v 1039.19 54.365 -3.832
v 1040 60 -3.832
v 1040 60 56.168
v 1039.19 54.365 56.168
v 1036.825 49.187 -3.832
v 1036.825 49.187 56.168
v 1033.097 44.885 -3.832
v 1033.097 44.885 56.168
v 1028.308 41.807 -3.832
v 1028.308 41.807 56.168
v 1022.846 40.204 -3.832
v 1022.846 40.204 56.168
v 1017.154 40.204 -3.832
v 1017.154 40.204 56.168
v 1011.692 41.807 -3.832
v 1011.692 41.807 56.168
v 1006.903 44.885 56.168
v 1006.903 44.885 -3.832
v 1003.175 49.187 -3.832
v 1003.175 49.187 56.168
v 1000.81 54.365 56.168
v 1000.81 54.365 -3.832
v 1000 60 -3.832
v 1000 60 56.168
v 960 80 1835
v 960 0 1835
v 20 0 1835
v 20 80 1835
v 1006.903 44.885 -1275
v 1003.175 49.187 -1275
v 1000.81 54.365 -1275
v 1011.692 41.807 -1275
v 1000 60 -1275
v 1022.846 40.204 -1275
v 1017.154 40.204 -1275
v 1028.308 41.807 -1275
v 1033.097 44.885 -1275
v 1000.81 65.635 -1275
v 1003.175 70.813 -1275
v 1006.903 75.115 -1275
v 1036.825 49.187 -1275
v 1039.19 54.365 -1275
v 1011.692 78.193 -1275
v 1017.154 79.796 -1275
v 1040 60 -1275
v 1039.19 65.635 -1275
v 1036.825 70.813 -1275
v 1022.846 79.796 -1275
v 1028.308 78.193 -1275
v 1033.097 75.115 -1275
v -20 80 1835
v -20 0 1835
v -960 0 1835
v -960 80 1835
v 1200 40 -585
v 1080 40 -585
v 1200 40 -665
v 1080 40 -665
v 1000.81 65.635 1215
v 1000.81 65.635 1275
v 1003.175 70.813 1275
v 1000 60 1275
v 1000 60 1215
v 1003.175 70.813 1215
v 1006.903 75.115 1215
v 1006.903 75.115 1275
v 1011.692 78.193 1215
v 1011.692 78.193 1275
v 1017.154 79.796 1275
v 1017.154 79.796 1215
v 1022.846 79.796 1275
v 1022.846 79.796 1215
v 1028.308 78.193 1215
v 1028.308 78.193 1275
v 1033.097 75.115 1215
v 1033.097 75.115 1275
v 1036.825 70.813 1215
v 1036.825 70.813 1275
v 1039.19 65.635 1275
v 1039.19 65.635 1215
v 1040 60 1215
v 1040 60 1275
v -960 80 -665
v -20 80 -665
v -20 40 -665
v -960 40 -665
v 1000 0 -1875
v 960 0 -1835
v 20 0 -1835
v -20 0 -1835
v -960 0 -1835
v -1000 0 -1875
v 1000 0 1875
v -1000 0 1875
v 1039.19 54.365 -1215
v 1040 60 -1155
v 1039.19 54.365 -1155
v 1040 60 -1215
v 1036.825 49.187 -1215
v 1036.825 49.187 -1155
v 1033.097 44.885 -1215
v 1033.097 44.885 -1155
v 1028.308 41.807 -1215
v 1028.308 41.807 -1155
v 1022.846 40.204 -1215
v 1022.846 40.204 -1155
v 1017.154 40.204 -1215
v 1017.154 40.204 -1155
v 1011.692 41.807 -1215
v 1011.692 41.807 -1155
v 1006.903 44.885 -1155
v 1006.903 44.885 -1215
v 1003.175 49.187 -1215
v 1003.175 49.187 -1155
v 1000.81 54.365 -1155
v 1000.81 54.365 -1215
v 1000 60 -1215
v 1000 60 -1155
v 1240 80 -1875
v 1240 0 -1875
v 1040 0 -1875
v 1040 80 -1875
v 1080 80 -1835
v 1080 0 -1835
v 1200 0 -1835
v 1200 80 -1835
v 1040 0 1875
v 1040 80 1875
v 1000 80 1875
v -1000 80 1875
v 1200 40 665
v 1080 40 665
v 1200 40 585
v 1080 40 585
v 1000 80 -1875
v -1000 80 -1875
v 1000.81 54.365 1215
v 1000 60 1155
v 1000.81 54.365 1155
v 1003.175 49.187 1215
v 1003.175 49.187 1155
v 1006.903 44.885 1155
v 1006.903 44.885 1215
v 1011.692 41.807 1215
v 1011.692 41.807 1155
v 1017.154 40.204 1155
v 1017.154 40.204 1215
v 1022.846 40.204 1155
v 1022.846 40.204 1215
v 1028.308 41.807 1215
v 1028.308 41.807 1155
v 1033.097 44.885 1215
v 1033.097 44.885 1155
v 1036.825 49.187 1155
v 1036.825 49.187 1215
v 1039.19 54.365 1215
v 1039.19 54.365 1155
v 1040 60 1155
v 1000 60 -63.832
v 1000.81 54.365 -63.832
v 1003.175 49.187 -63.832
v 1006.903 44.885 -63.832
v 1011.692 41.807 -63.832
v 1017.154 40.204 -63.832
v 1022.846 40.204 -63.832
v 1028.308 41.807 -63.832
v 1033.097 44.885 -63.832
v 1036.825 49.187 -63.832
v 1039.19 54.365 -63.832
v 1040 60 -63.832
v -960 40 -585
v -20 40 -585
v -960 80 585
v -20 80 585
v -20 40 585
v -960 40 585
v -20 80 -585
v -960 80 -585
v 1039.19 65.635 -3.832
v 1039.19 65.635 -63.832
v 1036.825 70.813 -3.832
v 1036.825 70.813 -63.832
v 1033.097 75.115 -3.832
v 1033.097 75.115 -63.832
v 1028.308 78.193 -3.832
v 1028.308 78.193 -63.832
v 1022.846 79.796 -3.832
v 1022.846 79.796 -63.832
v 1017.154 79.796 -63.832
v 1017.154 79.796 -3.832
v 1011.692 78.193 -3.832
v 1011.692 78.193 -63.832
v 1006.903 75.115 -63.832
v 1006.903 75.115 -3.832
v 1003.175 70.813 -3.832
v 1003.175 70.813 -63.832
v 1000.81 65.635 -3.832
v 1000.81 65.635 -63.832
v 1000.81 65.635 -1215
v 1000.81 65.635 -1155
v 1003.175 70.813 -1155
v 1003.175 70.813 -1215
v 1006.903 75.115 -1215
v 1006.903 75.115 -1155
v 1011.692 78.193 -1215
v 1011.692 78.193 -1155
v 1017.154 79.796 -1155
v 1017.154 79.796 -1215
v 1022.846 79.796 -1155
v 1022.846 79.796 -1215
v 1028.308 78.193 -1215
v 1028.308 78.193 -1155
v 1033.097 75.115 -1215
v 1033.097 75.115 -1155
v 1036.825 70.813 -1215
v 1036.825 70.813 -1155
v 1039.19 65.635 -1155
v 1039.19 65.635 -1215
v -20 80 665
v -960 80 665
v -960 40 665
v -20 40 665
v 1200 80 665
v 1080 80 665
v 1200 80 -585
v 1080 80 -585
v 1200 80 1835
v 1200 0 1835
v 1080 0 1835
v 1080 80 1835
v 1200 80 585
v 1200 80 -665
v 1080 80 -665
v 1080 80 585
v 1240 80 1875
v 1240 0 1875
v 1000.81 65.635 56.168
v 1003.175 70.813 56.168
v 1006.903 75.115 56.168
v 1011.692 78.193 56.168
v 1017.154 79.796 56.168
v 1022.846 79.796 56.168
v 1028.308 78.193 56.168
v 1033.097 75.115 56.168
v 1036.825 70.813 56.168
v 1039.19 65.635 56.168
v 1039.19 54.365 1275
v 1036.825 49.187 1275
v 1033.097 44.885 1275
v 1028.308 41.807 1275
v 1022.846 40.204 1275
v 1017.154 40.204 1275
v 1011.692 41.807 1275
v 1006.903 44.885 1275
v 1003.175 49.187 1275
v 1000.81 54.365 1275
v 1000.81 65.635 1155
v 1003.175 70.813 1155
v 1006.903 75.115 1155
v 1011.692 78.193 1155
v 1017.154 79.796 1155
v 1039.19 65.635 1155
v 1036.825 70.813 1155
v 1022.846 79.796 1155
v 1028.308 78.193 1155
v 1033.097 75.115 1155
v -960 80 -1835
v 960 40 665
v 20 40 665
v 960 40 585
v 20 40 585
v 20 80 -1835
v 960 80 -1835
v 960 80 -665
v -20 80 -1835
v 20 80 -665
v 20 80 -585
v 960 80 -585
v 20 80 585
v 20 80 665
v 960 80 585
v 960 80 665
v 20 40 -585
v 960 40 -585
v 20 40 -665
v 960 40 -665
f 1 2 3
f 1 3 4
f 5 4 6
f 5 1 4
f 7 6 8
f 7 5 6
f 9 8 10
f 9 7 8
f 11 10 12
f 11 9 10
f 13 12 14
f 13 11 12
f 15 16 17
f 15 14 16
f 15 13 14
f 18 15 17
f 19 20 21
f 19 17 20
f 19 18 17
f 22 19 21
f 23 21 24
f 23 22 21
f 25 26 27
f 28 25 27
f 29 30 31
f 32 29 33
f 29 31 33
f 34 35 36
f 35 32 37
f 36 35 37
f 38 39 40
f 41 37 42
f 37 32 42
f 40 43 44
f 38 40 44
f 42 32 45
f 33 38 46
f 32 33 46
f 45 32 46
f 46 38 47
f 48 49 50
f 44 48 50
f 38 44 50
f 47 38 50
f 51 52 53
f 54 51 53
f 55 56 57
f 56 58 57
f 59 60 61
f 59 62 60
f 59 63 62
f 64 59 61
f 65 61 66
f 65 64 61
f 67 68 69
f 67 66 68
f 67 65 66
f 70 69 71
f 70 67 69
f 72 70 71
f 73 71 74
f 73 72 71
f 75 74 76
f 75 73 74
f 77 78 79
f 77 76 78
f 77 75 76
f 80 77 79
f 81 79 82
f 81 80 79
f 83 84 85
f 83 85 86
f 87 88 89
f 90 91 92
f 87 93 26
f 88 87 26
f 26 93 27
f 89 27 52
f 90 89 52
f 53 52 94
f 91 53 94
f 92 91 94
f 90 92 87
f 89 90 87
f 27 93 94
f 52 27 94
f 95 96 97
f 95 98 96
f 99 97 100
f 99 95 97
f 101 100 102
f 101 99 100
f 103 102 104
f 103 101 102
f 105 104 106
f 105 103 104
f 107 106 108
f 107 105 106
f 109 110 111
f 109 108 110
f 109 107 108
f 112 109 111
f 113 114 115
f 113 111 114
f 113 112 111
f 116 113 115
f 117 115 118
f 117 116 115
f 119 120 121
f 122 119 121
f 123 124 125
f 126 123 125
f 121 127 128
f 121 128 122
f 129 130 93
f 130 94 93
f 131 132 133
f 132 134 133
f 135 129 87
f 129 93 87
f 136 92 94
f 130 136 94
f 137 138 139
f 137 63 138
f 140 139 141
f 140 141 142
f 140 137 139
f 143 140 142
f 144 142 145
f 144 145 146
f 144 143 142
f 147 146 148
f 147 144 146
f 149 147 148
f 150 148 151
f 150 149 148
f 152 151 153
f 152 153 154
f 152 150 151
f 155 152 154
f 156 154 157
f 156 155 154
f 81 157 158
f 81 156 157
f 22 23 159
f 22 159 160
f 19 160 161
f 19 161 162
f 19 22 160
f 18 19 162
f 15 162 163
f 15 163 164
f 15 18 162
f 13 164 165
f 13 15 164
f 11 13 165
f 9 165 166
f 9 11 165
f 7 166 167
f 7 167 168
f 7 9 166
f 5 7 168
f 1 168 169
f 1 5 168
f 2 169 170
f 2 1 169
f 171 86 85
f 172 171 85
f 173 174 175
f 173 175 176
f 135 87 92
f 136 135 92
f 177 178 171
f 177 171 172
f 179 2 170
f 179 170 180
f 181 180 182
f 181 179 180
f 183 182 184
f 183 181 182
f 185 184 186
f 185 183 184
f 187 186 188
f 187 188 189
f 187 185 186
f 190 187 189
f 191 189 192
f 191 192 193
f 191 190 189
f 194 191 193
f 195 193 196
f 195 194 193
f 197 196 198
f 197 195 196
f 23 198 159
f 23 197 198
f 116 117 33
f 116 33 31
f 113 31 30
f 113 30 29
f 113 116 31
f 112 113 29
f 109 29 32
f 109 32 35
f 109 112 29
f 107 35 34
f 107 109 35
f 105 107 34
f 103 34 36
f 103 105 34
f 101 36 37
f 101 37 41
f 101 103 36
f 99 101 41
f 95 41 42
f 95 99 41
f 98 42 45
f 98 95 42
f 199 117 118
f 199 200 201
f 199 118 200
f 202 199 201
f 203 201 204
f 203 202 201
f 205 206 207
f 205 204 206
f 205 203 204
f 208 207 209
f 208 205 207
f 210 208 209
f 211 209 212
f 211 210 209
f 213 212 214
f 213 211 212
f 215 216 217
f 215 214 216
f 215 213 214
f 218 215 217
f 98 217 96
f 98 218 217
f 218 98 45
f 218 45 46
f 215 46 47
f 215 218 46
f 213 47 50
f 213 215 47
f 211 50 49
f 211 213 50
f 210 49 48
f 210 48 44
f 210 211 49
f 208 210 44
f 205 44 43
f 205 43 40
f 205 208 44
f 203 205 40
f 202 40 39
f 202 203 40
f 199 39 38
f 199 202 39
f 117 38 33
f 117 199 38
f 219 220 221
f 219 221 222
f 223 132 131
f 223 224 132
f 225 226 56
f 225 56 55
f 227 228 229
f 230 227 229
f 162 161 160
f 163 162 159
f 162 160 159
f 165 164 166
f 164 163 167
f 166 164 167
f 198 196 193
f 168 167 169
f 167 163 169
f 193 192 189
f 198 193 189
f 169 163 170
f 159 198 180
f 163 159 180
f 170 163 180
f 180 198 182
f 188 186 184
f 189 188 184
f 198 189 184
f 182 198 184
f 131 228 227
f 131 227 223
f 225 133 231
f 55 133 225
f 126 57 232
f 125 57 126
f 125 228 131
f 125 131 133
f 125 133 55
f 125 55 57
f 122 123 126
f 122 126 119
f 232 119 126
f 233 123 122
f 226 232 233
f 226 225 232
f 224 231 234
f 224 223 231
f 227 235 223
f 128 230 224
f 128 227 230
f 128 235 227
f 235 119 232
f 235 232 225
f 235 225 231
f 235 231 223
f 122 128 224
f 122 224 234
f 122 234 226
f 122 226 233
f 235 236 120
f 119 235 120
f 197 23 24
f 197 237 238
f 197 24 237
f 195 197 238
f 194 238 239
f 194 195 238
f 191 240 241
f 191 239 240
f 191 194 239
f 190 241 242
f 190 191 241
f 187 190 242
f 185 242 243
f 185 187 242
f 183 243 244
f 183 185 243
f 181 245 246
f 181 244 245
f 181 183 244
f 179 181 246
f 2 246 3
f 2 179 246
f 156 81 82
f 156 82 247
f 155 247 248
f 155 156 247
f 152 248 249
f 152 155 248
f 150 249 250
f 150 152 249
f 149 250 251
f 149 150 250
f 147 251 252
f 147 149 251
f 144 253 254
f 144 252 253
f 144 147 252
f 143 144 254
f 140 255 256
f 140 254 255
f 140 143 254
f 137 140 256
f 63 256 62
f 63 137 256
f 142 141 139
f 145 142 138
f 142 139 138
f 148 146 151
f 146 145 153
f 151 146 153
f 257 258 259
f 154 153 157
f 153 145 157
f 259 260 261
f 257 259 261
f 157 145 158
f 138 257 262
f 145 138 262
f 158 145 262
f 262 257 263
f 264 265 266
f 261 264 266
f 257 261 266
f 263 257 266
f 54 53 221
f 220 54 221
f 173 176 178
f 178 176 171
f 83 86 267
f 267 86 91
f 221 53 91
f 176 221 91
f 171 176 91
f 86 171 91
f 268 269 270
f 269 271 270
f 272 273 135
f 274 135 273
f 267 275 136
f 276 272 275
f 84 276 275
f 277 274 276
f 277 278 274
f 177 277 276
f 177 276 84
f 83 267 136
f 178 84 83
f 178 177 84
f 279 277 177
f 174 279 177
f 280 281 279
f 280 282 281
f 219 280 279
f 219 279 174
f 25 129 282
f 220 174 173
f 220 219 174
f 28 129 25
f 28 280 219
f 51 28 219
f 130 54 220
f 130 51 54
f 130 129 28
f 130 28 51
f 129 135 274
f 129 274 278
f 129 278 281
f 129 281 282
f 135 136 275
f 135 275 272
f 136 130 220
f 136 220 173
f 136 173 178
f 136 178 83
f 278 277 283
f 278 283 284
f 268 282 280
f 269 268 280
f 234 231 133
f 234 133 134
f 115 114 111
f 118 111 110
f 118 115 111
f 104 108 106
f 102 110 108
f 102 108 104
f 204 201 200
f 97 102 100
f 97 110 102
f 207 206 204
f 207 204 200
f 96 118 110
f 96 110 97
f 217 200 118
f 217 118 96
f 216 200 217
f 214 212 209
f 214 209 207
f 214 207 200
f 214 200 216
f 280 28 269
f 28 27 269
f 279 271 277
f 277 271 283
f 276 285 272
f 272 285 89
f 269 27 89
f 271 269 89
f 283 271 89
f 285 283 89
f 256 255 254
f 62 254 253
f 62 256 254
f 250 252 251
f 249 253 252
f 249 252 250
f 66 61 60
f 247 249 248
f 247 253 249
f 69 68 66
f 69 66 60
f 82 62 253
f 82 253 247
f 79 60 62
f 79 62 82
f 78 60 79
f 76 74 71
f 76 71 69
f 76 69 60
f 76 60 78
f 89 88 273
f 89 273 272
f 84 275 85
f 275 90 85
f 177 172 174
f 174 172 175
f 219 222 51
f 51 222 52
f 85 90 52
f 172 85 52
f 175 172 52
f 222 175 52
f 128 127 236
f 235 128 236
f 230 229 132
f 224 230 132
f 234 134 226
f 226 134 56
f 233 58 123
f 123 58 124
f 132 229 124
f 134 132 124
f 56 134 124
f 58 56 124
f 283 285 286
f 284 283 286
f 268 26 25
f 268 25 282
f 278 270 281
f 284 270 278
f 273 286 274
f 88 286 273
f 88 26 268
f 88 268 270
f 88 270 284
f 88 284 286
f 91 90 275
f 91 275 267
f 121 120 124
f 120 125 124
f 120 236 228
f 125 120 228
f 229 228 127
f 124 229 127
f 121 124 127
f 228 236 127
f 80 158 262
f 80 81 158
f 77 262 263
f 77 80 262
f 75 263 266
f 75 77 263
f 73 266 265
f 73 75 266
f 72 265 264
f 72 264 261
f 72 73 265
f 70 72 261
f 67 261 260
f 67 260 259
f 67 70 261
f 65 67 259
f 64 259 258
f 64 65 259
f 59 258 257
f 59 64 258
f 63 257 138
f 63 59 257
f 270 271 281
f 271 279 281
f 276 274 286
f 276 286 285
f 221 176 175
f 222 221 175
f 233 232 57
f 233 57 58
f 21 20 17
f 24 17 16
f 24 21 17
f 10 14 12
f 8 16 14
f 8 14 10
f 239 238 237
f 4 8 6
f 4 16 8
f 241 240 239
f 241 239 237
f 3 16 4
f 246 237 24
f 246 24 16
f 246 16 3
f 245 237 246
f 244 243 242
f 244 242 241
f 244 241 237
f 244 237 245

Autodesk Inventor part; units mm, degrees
sketch "Sketch1" plane through (0, 0, 0) normal (0, 1, 0) x (-1, 0, 0)
  line L0 (1000, 1875) -> (-1000, 1875)
  line L1 (-1000, 1875) -> (-1000, -1875)
  line L2 (-1000, -1875) -> (1000, -1875)
  line L3 (1000, -1875) -> (1000, 1875)
  line L4 (1000, 1875) -> (-1000, -1875) construction
  line L5 (-1000, 1875) -> (1000, -1875) construction
  line L6 (1000, 1875) -> (-1000, 1875)
  line L7 (-1000, 1875) -> (-1000, 1835)
  line L8 (-1000, 1835) -> (1000, 1835)
  line L9 (1000, 1835) -> (1000, 1875)
  line L10 (1000, -1875) -> (-1000, -1875)
  line L11 (-1000, -1875) -> (-1000, -1835)
  line L12 (-1000, -1835) -> (1000, -1835)
  line L13 (1000, -1835) -> (1000, -1875)
  line L14 (-1000, 40) -> (-1000, -40)
  line L15 (1000, -40) -> (1000, 40)
  line L16 (-960, 38.4) -> (1000, -40) construction
  line L17 (1000, 1875) -> (960, 1875)
  line L18 (960, 1835) -> (960, -1835)
  line L19 (960, -1875) -> (1000, -1875)
  line L20 (1000, -1875) -> (1000, 1875)
  line L21 (-1000, 1875) -> (-960, 1875)
  line L22 (-960, 1835) -> (-960, -1835)
  line L23 (-960, -1875) -> (-1000, -1875)
  line L24 (-1000, -1875) -> (-1000, 1875)
  line L25 (20, 1875) -> (-20, 1875)
  line L26 (-20, 1835) -> (-20, -1835)
  line L27 (-20, -1875) -> (20, -1875)
  line L28 (20, -1835) -> (20, 1835)
  line L29 (20, 1875) -> (-20, -1875) construction
  line L30 (-20, 1875) -> (20, -1875) construction
  line L31 (-1000, 1875) -> (-1000, 1275) construction
  line L32 (-1000, -1875) -> (-1000, -1275) construction
  line L33 (-1000, 1275) -> (-1040, 1275)
  line L34 (-1040, 1275) -> (-1040, 1155)
  line L35 (-1040, 1155) -> (-1000, 1155)
  line L36 (-1000, 1155) -> (-1000, 1275)
  line L37 (-1000, -1275) -> (-1040, -1275)
  line L38 (-1040, -1275) -> (-1040, -1155)
  line L39 (-1040, -1155) -> (-1000, -1155)
  line L40 (-1000, -1155) -> (-1000, -1275)
  line L41 (-1000, 60) -> (-1040, 60)
  line L42 (-1040, 60) -> (-1040, -60)
  line L43 (-1040, -60) -> (-1000, -60)
  line L44 (-1000, -60) -> (-1000, 60)
  line L45 (-1040, 1875) -> (-1240, 1875)
  line L46 (-1240, 1875) -> (-1240, -1875)
  line L47 (-1240, -1875) -> (-1040, -1875)
  line L48 (-1040, -1875) -> (-1040, 1875)
  line L49 (-1040, 1875) -> (-1240, 1875)
  line L50 (-1240, 1875) -> (-1240, 1835)
  line L51 (-1240, 1835) -> (-1040, 1835)
  line L52 (-1040, 1835) -> (-1040, 1875)
  line L53 (-1240, 1875) -> (-1200, 1875)
  line L54 (-1200, 1835) -> (-1200, -1835)
  line L55 (-1200, -1875) -> (-1240, -1875)
  line L56 (-1240, -1875) -> (-1240, 1875)
  line L57 (-1040, -1835) -> (-1240, -1835)
  line L58 (-1240, -1835) -> (-1240, -1875)
  line L59 (-1240, -1875) -> (-1040, -1875)
  line L60 (-1040, -1875) -> (-1040, -1835)
  line L61 (-1040, 1875) -> (-1080, 1875)
  line L62 (-1080, 1835) -> (-1080, -1835)
  line L63 (-1080, -1875) -> (-1040, -1875)
  line L64 (-1040, -1875) -> (-1040, 1875)
  line L65 (-1080, 40) -> (-1200, 40)
  line L66 (-1240, 40) -> (-1240, -40)
  line L67 (-1200, -40) -> (-1080, -40)
  line L68 (-1080, -40) -> (-1080, 40)
  line L69 (-998.5851, 1275.1499) -> (-998.5851, 1144.5155) construction
  line L70 (-998.5851, 1144.5155) -> (-1036.0656, 1144.5155) construction
  line L71 (-1036.0656, 1144.5155) -> (-1036.0656, 1275.1499) construction
  line L72 (-1036.0656, 1275.1499) -> (-998.5851, 1275.1499) construction
  line L73 (-1007.8995, 60.5323) -> (-1007.8995, -70.1021) construction
  line L74 (-1007.8995, -70.1021) -> (-1038.0125, -70.1021) construction
  line L75 (-1038.0125, -70.1021) -> (-1038.0125, 60.5323) construction
  line L76 (-1038.0125, 60.5323) -> (-1007.8995, 60.5323) construction
  line L77 (-1037.0125, -1157.0323) -> (-1006.8995, -1157.0323) construction
  line L78 (-1006.8995, -1157.0323) -> (-1006.8995, -1287.6667) construction
  line L79 (-1006.8995, -1287.6667) -> (-1037.0125, -1287.6667) construction
  line L80 (-1037.0125, -1287.6667) -> (-1037.0125, -1157.0323) construction
  line L81 (1000, 1875) -> (1000, 625) construction
  line L82 (1000, -1875) -> (1000, -625) construction
  line L83 (1000, -625) -> (-1000, -625) construction
  line L84 (960, 625) -> (-1000, 625) construction
  line L85 (-960, 665) -> (-960, 585)
  line L86 (960, 585) -> (960, 665)
  line L87 (960, 665) -> (-960, 585) construction
  line L88 (-960, 665) -> (960, 585) construction
  line L89 (-960, -585) -> (-960, -665)
  line L90 (960, -665) -> (960, -585)
  line L91 (960, -585) -> (-960, -665) construction
  line L92 (-960, -585) -> (960, -665) construction
  line L93 (960, 665) -> (20, 665)
  line L94 (-20, 665) -> (-960, 665)
  line L95 (-960, 585) -> (-20, 585)
  line L96 (20, 585) -> (960, 585)
  line L97 (960, -585) -> (20, -585)
  line L98 (-20, -585) -> (-960, -585)
  line L99 (-960, -665) -> (-20, -665)
  line L100 (20, -665) -> (960, -665)
  point P0 (0, 0)
  point P1 (-1000, 0)
  point P2 (-1040, -60)
  point P3 (0, 625)
  point P4 (0, -625)
  dimension "d0" = 2000
  dimension "d1" = 3750
  dimension "d2" = 40
  dimension "d3" = 40
  dimension "d4" = 80
  dimension "d5" = 40
  dimension "d6" = 40
  dimension "d7" = 40
  dimension "d8" = 600
  dimension "d9" = 600
  dimension "d10" = 40
  dimension "d11" = 120
  dimension "d12" = 40
  dimension "d13" = 120
  dimension "d14" = 40
  dimension "d15" = 120
  dimension "d16" = 200
  dimension "d17" = 40
  dimension "d18" = 40
  dimension "d30" = 1250
  dimension "d31" = 1250
  dimension "d32" = 80
  dimension "d33" = 80
extrude "Extrusion1" add sketch "Sketch1" along normal blind 80 contours L3 L8 L1 L0 | L3 L12 L18 L8 | L28 L12 L26 L8 | L3 L2 L1 L12 | L22 L12 L1 L8 | L34 L48 L42 L38 L57 L62 L51 | L51 L46 L45 L48 | L54 L57 L46 L51 | L48 L47 L46 L57
sketch "Sketch2" plane through (0, 80, 0) normal (0, 1, 0) x (1, 0, 0)
  line L0 (960, 40) -> (-1000, 40) construction
  line L1 (-1000, -40) -> (960, -40) construction
  line L2 (1200, 40) -> (1080, 40) construction
  line L3 (1080, -40) -> (1200, -40) construction
  line L4 (1000, -1275) -> (1040, -1275) construction
  line L5 (1040, -1155) -> (1000, -1155) construction
  line L6 (1000, -60) -> (1040, -60) construction
  line L7 (1040, 60) -> (1000, 60) construction
  line L8 (1040, 1155) -> (1000, 1155) construction
  line L9 (1000, 1275) -> (1040, 1275) construction
  line L10 (-960, -1835) -> (-960, 1835) projected
  line L11 (-20, 1835) -> (-20, -1835) projected
  line L12 (-960, -40) -> (-20, -40)
  line L13 (-20, -40) -> (-20, 40)
  line L14 (-20, 40) -> (-960, 40)
  line L15 (-960, 40) -> (-960, -40)
  line L16 (20, -1835) -> (20, 1835) projected
  line L17 (20, -40) -> (960, -40)
  line L18 (960, -40) -> (960, 40)
  line L19 (960, 40) -> (20, 40)
  line L20 (20, 40) -> (20, -40)
  line L21 (1080, -40) -> (1200, -40)
  line L22 (1200, -40) -> (1200, 40)
  line L23 (1200, 40) -> (1080, 40)
  line L24 (1080, 40) -> (1080, -40)
  line L25 (-20, -585) -> (-960, -585) projected
  line L26 (-960, -665) -> (-20, -665) projected
  line L27 (20, -665) -> (960, -665) projected
  line L28 (960, -585) -> (20, -585) projected
  line L29 (20, -1835) -> (20, 1835) projected
  line L30 (960, 1835) -> (960, -1835) construction
  line L31 (-960, 585) -> (-20, 585) projected
  line L32 (-20, 665) -> (-960, 665) projected
  line L33 (20, 585) -> (960, 585) projected
  line L34 (960, 665) -> (20, 665) projected
  line L35 (960, 585) -> (-960, 665) construction
  line L36 (1080, -1835) -> (1080, 1835) projected
  line L37 (1080, -665) -> (1200, -665)
  line L38 (1200, -665) -> (1200, -585)
  line L39 (1200, -585) -> (1080, -585)
  line L40 (1080, -585) -> (1080, -665)
  line L41 (1200, 1835) -> (1200, -1835) projected
  line L42 (1080, 585) -> (1200, 585)
  line L43 (1200, 585) -> (1200, 665)
  line L44 (1200, 665) -> (1080, 665)
  line L45 (1080, 665) -> (1080, 585)
  point P0 (0, 0)
sketch "Sketch3" plane through (1000, 0, 1875) normal (1, 0, 0) x (0, 0, -1)
  line L0 (0, 0) -> (3750, 0) construction
  line L1 (3750, 0) -> (3750, 80) construction
  line L2 (0, 80) -> (3750, 80) construction
  line L3 (0, 0) -> (0, 80) construction
  line L4 (0, 0) -> (0, 80) construction
  line L5 (0, 40) -> (3750, 40) construction
  line L6 (0, 80) -> (3750, 80) construction
  line L7 (600, 0) -> (720, 0) construction
  line L8 (720, 0) -> (720, 80) construction
  line L9 (720, 80) -> (600, 80) construction
  line L10 (600, 80) -> (600, 0) construction
  line L11 (1815, 0) -> (1935, 0) construction
  line L12 (1935, 0) -> (1935, 80) construction
  line L13 (1935, 80) -> (1815, 80) construction
  line L14 (1815, 80) -> (1815, 0) construction
  line L15 (3030, 0) -> (3150, 0) construction
  line L16 (3150, 0) -> (3150, 80) construction
  line L17 (3150, 80) -> (3030, 80) construction
  line L18 (3030, 80) -> (3030, 0) construction
  point P0 (1875, 0)
  point P1 (660, 40)
  point P2 (1878.8319, 40)
  point P3 (3090, 40)
ref_plane "Work Plane1" through (1000, 40, 1215) normal (0, 0, 1) x (1, 0, 0)
ref_plane "Work Plane2" through (1000, 40, -3.8319) normal (0, 0, 1) x (1, 0, 0)
ref_plane "Work Plane3" through (1000, 40, -1215) normal (0, 0, 1) x (1, 0, 0)
sketch "Sketch4" plane through (1000, 40, 1215) normal (0, 0, 1) x (1, 0, 0)
  circle A0 centre (20, 20) radius 20
  line L0 (40, -40) -> (40, 40) projected
  line L1 (-2000, 40) -> (0, 40) construction
  line L2 (0, 40) -> (40, 40) construction
  point P0 (-1000, -40)
  dimension "d23" = 40
sketch "Sketch5" plane through (1000, 40, -3.8319) normal (0, 0, 1) x (1, 0, 0)
  point P0 (-1000, -40)
sketch "Sketch6" plane through (1000, 40, -3.8319) normal (0, 0, 1) x (1, 0, 0)
  circle A0 centre (20, 20) radius 20 projected
  point P0 (-1000, -40)
sketch "Sketch7" plane through (1000, 40, -1215) normal (0, 0, 1) x (1, 0, 0)
  circle A0 centre (20, 20) radius 20 projected
  point P0 (-1000, -40)
extrude "Extrusion3" add sketch "Sketch4" along normal mid plane 120
extrude "Extrusion4" add sketch "Sketch6" along normal mid plane 120
extrude "Extrusion5" add sketch "Sketch7" along normal mid plane 120
extrude "Extrusion6" add sketch "Sketch2" against normal blind 40 contours L10 L25 L11 L26 | L10 L32 L11 L31 | L39 L38 L37 L36 | L36 L44 L41 L42
sketch "Sketch8" plane through (0, 80, 0) normal (0, 1, 0) x (1, 0, 0)
  line L0 (960, -585) -> (20, -585) construction
  line L1 (20, -1835) -> (20, 1835) construction
  line L2 (20, -665) -> (960, -665) construction
  line L3 (20, 585) -> (960, 585) construction
  line L4 (960, 665) -> (20, 665) construction
  line L5 (960, 1835) -> (960, -1835) construction
  line L6 (960, -665) -> (20, -665)
  line L7 (20, -665) -> (20, -585)
  line L8 (20, -585) -> (960, -585)
  line L9 (960, -585) -> (960, -665)
  line L10 (20, 585) -> (960, 585)
  line L11 (960, 585) -> (960, 665)
  line L12 (960, 665) -> (20, 665)
  line L13 (20, 665) -> (20, 585)
  point P0 (0, 0)
extrude "Extrusion7" add sketch "Sketch8" against normal blind 40
properties part number "diagrama_cerrajero"
